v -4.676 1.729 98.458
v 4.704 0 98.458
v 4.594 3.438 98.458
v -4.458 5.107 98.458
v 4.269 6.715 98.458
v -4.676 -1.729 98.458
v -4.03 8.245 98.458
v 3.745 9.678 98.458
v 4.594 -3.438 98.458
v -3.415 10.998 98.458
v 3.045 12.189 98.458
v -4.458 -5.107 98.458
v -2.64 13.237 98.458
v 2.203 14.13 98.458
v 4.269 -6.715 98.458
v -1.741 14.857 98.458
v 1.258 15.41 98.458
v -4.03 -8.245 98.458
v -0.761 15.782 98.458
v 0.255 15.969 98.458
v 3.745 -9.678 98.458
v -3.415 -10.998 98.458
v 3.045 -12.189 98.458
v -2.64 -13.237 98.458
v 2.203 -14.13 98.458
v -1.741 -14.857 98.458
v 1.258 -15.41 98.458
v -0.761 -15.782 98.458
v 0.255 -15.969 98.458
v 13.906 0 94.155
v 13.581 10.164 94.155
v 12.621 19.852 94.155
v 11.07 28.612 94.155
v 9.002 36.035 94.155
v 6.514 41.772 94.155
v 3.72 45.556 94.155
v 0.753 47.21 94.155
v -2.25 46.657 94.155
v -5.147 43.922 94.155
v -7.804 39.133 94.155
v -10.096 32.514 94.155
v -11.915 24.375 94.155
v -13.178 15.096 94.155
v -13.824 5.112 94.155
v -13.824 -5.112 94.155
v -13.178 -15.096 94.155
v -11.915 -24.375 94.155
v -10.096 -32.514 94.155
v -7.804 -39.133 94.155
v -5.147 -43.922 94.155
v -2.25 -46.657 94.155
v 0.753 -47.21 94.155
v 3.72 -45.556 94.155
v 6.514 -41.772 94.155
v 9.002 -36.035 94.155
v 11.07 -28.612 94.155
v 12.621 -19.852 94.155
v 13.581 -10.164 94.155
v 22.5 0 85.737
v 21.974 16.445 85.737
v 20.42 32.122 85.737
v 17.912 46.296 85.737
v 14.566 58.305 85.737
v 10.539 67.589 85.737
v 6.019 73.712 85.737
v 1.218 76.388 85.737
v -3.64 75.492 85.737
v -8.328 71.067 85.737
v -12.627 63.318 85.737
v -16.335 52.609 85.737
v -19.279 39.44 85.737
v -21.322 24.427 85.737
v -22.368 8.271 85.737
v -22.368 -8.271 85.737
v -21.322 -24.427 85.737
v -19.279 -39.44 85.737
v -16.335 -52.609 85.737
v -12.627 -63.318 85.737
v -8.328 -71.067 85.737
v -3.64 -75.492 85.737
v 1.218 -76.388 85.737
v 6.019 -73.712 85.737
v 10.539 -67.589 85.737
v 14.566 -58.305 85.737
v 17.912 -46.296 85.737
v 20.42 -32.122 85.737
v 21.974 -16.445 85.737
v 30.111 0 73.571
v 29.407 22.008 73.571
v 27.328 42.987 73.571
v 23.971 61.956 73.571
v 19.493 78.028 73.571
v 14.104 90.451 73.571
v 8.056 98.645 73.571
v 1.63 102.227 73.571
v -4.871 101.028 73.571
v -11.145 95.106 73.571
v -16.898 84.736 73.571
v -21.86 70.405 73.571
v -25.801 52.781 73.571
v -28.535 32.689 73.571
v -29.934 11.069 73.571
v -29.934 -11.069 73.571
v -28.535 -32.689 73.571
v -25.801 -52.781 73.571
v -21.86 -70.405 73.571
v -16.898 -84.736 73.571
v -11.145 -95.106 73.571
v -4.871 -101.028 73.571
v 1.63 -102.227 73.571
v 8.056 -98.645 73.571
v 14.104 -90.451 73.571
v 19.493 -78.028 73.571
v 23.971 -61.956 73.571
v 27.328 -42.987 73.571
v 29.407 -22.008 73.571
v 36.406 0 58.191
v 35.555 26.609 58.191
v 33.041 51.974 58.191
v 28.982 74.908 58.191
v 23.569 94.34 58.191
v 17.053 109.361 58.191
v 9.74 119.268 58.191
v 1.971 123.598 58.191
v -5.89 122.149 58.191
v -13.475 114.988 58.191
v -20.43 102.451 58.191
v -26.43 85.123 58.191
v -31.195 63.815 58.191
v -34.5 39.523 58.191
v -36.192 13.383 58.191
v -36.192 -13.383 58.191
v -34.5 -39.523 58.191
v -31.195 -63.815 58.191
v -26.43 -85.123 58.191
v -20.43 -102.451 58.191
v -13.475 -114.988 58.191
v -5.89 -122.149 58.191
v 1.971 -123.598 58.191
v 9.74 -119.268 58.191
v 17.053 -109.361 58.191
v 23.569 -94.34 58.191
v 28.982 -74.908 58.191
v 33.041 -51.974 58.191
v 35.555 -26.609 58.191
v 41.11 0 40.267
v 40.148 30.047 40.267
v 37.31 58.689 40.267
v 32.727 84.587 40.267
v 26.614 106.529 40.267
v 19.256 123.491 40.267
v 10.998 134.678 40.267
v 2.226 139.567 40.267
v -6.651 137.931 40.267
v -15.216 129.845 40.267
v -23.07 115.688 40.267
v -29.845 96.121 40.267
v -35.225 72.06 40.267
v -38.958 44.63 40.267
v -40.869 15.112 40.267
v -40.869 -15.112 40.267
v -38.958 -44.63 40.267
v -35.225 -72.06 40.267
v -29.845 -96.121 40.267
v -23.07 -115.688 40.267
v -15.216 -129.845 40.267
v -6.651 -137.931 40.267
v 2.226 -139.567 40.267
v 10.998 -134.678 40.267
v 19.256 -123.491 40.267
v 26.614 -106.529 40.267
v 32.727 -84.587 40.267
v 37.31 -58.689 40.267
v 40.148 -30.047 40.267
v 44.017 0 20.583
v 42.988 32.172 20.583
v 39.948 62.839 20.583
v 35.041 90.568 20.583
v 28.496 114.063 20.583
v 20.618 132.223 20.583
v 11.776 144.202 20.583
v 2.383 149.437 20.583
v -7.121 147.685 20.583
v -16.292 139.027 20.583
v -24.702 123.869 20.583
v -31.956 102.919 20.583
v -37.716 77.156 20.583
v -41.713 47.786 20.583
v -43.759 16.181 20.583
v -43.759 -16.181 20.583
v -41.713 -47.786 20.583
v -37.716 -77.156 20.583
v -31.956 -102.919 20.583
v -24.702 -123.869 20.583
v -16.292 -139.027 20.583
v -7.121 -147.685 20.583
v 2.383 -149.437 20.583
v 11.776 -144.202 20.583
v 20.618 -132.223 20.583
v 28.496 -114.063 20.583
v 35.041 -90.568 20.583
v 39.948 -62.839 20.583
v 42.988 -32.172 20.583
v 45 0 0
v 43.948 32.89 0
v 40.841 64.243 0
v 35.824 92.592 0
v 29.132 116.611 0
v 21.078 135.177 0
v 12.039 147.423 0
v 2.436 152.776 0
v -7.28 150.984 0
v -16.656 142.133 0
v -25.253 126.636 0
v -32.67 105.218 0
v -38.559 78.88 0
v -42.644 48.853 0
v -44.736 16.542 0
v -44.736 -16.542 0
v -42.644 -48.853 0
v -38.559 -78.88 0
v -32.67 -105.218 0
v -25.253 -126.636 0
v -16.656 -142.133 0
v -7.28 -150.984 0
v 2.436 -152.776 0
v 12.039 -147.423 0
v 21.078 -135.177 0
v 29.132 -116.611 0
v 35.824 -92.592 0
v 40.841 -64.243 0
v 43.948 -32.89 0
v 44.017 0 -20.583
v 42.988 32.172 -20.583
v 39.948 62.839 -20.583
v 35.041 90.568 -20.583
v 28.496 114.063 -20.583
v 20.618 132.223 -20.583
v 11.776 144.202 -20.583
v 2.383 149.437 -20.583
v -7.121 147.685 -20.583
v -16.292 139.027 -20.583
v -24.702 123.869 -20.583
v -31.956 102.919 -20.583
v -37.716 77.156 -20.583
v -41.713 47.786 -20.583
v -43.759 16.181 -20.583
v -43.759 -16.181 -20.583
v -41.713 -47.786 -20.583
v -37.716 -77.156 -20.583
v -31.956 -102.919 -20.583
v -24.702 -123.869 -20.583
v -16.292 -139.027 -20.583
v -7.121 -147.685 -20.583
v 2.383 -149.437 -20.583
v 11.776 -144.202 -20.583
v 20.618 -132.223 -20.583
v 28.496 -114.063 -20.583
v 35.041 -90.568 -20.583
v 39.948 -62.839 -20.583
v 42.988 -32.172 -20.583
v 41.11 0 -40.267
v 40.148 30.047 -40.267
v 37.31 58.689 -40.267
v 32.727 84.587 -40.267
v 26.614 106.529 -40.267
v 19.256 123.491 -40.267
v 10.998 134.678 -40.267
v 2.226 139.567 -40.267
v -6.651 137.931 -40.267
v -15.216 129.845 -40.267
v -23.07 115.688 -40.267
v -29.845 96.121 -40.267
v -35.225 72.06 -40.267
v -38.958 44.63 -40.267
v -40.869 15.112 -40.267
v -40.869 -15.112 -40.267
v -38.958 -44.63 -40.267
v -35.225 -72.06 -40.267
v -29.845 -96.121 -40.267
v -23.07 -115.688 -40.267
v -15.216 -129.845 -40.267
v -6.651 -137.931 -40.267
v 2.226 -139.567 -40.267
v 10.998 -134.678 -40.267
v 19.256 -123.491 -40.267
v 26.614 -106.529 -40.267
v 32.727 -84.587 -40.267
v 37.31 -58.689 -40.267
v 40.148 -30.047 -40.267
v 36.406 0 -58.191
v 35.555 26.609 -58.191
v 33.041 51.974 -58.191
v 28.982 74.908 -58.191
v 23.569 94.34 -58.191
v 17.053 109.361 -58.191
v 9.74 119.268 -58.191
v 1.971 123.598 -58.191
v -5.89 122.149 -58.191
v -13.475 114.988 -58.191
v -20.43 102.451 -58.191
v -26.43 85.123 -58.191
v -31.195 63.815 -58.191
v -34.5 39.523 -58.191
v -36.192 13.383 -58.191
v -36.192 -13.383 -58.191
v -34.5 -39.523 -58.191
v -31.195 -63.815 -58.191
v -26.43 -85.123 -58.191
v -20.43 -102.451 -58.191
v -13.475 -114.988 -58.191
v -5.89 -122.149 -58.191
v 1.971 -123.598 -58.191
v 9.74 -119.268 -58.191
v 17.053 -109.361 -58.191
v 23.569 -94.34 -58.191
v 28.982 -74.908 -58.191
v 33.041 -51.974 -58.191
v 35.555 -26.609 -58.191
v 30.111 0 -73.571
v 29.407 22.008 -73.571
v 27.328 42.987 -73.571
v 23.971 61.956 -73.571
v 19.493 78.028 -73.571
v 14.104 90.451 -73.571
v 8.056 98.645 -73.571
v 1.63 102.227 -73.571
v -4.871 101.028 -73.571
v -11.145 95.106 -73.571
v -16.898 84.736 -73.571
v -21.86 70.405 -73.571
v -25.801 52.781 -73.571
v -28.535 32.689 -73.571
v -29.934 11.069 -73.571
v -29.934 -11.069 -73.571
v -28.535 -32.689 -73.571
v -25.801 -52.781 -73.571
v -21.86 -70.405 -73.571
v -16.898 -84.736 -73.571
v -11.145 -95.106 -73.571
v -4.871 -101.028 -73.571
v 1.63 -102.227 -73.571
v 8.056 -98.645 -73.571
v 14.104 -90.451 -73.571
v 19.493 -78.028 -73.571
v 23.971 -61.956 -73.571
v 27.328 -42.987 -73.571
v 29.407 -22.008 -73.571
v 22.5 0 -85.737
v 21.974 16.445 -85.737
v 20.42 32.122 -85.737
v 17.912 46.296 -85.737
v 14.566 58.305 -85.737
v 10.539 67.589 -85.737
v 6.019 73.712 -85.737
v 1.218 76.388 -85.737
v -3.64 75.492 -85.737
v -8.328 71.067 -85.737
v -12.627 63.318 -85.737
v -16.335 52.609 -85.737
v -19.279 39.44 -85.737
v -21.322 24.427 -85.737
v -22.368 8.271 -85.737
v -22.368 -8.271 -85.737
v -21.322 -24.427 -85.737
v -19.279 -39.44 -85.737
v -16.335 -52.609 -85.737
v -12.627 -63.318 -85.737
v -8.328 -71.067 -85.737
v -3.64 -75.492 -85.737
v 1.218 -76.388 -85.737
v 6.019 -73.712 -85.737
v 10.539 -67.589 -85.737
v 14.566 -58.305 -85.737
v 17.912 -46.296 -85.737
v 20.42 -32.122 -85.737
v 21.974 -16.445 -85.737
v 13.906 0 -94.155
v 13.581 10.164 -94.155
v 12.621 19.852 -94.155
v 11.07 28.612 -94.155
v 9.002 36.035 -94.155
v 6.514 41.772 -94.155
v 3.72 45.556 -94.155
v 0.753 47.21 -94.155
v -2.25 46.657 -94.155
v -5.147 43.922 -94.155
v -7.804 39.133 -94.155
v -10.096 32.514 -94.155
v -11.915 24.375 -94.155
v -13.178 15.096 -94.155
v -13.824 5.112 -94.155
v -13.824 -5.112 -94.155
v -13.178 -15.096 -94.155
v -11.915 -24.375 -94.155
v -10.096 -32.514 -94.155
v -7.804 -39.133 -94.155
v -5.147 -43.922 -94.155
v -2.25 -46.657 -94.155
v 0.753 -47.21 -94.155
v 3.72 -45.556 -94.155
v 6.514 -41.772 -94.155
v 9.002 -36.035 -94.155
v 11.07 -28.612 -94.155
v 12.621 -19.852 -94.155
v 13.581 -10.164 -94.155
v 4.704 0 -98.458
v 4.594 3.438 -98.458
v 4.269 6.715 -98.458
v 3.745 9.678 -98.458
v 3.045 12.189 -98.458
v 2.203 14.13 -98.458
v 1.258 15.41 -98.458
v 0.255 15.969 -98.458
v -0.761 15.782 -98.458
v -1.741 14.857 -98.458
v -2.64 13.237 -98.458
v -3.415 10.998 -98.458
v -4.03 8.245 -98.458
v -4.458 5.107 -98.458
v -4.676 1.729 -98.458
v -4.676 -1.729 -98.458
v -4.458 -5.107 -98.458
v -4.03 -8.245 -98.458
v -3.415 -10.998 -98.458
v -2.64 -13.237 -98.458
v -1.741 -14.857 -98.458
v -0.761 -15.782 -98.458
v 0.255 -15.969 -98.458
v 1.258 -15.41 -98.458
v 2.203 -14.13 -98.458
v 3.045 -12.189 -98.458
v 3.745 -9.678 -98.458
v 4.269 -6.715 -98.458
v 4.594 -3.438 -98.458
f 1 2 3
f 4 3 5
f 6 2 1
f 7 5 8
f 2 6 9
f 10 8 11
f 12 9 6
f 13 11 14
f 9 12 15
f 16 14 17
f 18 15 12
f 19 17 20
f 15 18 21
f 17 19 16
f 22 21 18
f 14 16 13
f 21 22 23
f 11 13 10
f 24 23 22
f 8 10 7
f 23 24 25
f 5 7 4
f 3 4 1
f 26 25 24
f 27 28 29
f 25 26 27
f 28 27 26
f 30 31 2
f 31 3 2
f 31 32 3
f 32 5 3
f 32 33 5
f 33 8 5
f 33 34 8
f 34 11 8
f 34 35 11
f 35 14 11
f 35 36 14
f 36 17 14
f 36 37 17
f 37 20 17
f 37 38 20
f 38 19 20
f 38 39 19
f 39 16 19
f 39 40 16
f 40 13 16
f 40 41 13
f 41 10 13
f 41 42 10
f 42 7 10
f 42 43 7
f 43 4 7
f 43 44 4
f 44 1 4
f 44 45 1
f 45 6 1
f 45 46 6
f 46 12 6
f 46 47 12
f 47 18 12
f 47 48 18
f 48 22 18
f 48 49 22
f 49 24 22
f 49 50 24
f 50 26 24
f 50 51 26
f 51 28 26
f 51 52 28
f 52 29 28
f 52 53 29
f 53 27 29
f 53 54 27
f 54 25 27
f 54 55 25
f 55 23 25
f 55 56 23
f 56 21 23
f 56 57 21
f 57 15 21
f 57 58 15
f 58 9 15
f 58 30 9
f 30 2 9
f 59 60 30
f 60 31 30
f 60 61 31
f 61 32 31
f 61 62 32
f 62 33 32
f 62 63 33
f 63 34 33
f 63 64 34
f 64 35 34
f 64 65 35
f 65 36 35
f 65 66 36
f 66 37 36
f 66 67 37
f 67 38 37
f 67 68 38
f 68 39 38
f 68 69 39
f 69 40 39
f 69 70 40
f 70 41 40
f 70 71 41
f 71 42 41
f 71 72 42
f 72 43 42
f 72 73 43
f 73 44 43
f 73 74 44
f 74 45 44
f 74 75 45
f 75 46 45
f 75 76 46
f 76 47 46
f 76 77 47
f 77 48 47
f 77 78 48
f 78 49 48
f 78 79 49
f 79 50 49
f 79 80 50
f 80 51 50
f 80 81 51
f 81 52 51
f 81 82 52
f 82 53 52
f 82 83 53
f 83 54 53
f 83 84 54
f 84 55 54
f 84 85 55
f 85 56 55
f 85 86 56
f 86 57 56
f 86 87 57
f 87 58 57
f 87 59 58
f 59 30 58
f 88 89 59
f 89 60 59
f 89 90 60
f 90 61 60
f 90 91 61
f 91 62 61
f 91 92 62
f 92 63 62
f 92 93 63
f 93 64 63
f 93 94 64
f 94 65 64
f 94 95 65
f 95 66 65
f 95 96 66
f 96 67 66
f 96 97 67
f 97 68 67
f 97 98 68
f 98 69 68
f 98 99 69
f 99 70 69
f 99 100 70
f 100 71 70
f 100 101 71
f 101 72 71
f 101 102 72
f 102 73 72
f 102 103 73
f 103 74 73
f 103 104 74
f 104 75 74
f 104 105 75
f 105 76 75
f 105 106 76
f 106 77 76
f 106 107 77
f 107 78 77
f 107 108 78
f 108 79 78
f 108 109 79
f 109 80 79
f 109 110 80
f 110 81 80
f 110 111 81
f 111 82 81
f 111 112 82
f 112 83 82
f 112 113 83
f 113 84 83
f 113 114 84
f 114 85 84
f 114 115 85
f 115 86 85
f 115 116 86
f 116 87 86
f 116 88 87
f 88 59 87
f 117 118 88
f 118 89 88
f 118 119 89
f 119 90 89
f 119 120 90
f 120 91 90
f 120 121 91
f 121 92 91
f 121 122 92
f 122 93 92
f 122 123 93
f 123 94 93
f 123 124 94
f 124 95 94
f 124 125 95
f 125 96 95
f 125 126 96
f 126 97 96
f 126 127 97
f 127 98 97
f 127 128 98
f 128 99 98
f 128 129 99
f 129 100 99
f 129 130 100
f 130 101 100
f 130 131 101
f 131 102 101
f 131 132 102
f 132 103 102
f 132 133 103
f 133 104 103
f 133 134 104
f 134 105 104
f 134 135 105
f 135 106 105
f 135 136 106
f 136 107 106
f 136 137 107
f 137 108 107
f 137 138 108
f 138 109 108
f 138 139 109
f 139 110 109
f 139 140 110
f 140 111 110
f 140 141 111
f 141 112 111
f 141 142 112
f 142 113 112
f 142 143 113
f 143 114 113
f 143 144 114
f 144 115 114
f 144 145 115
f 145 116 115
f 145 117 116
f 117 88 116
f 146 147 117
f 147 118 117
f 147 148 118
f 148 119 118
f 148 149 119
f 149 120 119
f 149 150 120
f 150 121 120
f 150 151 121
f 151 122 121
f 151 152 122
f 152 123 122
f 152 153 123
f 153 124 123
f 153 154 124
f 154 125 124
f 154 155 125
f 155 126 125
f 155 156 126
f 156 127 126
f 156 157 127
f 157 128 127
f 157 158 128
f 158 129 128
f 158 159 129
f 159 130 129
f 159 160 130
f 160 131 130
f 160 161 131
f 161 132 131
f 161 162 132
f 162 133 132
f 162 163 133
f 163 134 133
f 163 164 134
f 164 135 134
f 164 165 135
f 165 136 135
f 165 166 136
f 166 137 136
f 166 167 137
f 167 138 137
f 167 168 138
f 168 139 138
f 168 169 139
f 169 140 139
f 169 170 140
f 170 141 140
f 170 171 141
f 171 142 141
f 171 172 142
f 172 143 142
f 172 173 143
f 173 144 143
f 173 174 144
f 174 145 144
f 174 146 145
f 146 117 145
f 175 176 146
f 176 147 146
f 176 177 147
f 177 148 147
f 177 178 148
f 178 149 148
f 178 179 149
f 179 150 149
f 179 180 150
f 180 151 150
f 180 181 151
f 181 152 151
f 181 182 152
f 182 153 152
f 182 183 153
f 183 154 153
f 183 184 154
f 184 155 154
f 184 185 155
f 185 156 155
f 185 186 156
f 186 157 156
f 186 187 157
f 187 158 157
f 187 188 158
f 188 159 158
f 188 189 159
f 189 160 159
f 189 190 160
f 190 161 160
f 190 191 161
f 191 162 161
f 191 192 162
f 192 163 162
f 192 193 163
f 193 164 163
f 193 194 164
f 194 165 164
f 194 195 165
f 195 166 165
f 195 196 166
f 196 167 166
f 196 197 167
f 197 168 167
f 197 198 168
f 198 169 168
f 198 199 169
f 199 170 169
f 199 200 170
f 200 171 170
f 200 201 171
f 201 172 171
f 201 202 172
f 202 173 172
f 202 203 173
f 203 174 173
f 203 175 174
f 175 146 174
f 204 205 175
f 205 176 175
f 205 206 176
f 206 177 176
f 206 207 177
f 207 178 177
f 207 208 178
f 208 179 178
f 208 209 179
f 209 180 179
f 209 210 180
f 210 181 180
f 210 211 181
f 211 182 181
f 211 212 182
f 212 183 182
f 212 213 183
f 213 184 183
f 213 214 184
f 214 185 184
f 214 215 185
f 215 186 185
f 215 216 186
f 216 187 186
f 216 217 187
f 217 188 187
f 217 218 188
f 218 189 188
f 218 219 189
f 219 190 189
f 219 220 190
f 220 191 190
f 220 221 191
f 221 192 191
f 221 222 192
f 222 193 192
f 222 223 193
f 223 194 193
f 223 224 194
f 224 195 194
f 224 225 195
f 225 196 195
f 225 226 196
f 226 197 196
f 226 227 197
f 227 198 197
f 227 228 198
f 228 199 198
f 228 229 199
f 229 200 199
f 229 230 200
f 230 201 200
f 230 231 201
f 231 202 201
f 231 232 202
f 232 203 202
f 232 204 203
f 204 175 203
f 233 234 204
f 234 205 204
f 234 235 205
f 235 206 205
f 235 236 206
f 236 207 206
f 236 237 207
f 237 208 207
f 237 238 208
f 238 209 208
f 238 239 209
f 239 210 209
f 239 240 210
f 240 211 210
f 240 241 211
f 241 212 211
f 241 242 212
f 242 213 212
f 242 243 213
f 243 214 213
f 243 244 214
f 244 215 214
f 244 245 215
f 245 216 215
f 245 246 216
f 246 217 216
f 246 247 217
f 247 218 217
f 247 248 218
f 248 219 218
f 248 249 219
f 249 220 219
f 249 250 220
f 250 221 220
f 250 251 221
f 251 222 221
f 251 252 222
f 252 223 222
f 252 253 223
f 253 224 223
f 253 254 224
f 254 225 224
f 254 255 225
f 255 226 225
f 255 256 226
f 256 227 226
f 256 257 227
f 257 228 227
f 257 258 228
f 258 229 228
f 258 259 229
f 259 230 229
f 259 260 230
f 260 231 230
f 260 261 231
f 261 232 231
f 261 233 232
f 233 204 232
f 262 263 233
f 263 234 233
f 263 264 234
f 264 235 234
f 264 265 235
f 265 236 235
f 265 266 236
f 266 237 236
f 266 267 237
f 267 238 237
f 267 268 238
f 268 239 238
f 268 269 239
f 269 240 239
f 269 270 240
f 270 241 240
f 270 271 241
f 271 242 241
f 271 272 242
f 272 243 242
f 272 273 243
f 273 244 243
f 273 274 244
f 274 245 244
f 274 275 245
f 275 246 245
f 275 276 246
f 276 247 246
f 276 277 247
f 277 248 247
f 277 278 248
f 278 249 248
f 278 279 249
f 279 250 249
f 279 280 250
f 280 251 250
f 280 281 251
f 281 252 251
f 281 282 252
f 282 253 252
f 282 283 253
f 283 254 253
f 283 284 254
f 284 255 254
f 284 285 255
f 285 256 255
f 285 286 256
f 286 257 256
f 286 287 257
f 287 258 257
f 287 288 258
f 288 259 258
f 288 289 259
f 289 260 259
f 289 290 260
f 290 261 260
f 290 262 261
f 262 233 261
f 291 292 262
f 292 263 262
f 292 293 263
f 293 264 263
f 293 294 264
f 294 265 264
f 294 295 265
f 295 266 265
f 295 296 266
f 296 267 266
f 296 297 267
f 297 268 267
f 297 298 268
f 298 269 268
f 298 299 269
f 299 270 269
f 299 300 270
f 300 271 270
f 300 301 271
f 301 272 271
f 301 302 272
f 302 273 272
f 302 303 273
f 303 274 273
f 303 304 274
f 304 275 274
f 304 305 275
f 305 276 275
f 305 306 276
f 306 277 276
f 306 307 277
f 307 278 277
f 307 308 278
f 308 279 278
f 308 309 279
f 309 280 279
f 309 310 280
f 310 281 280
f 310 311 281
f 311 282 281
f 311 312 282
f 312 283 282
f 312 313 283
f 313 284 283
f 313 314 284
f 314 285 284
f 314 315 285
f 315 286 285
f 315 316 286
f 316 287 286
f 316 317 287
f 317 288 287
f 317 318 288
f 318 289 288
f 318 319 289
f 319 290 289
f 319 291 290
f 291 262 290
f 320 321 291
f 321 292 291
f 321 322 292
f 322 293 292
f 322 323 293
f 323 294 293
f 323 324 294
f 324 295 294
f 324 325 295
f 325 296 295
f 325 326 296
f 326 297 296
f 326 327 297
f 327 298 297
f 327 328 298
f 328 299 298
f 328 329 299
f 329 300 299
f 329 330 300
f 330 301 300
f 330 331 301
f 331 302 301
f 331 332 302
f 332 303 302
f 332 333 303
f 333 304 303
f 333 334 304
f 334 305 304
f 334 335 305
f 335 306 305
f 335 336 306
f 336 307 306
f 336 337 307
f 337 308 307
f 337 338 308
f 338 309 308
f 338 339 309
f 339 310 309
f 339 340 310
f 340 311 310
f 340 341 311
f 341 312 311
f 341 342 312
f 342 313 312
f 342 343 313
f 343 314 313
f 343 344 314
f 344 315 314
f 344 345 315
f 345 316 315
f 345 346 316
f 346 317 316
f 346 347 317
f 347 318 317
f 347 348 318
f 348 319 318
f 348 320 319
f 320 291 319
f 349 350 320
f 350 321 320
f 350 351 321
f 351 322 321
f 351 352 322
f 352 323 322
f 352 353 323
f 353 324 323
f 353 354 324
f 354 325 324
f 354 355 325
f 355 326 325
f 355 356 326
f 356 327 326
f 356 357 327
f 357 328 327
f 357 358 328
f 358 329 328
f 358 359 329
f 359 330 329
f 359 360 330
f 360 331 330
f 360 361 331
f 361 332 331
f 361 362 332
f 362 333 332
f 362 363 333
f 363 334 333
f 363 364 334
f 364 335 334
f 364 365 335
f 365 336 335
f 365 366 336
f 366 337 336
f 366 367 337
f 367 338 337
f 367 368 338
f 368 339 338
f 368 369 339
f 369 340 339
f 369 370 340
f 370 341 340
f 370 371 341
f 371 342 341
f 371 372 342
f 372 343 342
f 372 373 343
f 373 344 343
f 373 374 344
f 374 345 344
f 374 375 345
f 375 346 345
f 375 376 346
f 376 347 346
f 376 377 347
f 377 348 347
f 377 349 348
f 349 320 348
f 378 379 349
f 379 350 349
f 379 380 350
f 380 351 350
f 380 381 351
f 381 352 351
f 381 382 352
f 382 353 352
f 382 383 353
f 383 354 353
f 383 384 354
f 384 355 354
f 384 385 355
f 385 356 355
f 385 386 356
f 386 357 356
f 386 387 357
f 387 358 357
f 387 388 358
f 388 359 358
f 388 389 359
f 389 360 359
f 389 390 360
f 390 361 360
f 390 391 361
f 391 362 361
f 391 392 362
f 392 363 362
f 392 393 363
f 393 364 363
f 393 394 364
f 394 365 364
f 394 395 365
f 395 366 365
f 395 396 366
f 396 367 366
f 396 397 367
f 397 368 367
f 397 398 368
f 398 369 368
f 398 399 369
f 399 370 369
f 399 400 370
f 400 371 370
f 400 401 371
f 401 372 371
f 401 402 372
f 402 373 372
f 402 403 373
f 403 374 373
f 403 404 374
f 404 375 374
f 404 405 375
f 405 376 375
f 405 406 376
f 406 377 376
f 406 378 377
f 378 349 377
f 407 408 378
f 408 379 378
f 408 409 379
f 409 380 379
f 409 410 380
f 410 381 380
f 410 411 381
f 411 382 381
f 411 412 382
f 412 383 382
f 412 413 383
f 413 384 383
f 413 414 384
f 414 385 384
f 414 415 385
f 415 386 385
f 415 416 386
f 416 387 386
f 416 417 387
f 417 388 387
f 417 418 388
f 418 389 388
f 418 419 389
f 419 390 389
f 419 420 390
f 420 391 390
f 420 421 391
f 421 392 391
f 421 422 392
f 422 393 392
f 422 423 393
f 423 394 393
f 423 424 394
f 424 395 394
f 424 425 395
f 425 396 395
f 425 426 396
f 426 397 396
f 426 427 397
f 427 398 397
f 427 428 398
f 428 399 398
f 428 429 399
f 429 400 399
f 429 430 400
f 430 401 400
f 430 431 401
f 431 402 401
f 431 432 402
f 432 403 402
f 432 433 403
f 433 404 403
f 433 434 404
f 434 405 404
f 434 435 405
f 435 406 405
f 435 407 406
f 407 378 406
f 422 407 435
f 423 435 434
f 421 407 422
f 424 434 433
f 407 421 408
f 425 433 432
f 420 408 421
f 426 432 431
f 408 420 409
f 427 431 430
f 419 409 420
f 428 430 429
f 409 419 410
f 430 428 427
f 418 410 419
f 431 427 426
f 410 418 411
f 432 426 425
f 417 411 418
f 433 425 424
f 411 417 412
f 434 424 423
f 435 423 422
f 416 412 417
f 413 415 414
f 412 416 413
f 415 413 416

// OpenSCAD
// Generated by SolidPython 1.0.1 on 2020-07-29 00:46:47


scale(v = [5, 17, 11]) {
	sphere(r = 9);
}
/***********************************************
*********      SolidPython code:      **********
************************************************
 
# import packages: SolidPython
from solid import *
from solid.utils import *
from itertools import chain, combinations, permutations


class Resize:

    def __init__(self, scad_file):
        self.scad_file = scad_file
        #self.scad_file = import_scad(scad_file)
        # cone/cylinder param:
        self.r1 = 0
        self.r2 = 0
        self.h = 0
        # rectangular prism param:
        self.w = 0
        self.l = 0
        # ellipse param:
        self.r = 0

    # import OpenScad code (file name corresponds to shape)


    # classify shape + parameters
    def assign(self, param1, param2, param3):
        if self.scad_file == 'cone.scad':
            self.r1 = param1
            self.r2 = param2
            self.h = param3
        elif self.scad_file == 'cylinder.scad':
            self.r1 = param1
            self.r2 = param2
            self.h = param3
        elif self.scad_file == 'rectangularPrism.scad':
            self.h = param1
            self.l = param2
            self.w = param3
        else:
            self.r = param1
            self.h = param2

    # resize parameters
    def iterate(self):
        x = range(3, 20, 2)
        i = 1
        if self.scad_file == 'cone.scad':
            tempList = list(permutations(x, 2))
            for temp in tempList:
                param1 = temp[0]
                param2 = temp[1]
                filepath = 'produced_scad_files/' + 'cone' + str(param1) + '_' + str(param2) + '_' + '.scad'
                scad_render_to_file(cylinder(h=param1, r1=param2, r2=0), filepath)

        elif self.scad_file == 'cylinder.scad':
            tempList = list(permutations(x, 3))
            for temp in tempList:
                param1 = temp[0]
                param2 = temp[1]
                filepath = 'produced_scad_files/' + 'cylinder' + str(param1) + '_' + str(param2) + '_' + '.scad'
                scad_render_to_file(cylinder(h=param1, r1=param2, r2=param2), filepath)

        elif self.scad_file == 'rectangularPrism.scad':
            tempList = list(permutations(x, 3))
            for temp in tempList:
                param1 = temp[0]
                param2 = temp[1]
                param3 = temp[2]
                filepath = 'produced_scad_files/' + 'rectangularPrism' + str(param1) + '_' + str(param2) + '_' + str(
                    param3) + '.scad'
                scad_render_to_file(cube(size=(param1, param2, param3)), filepath)

        elif self.scad_file == 'ellipse.scad':
            tempList = list(permutations(x, 4))
            for temp in tempList:
                param1 = temp[0]
                param2 = temp[1]
                param3 = temp[2]
                param4 = temp[3]
                filepath = 'produced_scad_files/' + 'ellipse' + str(param1) + '_' + str(param2) + '_' + str(param3) + '_' + str(param4) + '.scad'
                scad_render_to_file(scale([param1, param2, param3])(sphere(r=param4)), filepath)

    def render_to_scadfile(self):
        scad_render_to_file(scad, 'example.scad') 
 
************************************************/
